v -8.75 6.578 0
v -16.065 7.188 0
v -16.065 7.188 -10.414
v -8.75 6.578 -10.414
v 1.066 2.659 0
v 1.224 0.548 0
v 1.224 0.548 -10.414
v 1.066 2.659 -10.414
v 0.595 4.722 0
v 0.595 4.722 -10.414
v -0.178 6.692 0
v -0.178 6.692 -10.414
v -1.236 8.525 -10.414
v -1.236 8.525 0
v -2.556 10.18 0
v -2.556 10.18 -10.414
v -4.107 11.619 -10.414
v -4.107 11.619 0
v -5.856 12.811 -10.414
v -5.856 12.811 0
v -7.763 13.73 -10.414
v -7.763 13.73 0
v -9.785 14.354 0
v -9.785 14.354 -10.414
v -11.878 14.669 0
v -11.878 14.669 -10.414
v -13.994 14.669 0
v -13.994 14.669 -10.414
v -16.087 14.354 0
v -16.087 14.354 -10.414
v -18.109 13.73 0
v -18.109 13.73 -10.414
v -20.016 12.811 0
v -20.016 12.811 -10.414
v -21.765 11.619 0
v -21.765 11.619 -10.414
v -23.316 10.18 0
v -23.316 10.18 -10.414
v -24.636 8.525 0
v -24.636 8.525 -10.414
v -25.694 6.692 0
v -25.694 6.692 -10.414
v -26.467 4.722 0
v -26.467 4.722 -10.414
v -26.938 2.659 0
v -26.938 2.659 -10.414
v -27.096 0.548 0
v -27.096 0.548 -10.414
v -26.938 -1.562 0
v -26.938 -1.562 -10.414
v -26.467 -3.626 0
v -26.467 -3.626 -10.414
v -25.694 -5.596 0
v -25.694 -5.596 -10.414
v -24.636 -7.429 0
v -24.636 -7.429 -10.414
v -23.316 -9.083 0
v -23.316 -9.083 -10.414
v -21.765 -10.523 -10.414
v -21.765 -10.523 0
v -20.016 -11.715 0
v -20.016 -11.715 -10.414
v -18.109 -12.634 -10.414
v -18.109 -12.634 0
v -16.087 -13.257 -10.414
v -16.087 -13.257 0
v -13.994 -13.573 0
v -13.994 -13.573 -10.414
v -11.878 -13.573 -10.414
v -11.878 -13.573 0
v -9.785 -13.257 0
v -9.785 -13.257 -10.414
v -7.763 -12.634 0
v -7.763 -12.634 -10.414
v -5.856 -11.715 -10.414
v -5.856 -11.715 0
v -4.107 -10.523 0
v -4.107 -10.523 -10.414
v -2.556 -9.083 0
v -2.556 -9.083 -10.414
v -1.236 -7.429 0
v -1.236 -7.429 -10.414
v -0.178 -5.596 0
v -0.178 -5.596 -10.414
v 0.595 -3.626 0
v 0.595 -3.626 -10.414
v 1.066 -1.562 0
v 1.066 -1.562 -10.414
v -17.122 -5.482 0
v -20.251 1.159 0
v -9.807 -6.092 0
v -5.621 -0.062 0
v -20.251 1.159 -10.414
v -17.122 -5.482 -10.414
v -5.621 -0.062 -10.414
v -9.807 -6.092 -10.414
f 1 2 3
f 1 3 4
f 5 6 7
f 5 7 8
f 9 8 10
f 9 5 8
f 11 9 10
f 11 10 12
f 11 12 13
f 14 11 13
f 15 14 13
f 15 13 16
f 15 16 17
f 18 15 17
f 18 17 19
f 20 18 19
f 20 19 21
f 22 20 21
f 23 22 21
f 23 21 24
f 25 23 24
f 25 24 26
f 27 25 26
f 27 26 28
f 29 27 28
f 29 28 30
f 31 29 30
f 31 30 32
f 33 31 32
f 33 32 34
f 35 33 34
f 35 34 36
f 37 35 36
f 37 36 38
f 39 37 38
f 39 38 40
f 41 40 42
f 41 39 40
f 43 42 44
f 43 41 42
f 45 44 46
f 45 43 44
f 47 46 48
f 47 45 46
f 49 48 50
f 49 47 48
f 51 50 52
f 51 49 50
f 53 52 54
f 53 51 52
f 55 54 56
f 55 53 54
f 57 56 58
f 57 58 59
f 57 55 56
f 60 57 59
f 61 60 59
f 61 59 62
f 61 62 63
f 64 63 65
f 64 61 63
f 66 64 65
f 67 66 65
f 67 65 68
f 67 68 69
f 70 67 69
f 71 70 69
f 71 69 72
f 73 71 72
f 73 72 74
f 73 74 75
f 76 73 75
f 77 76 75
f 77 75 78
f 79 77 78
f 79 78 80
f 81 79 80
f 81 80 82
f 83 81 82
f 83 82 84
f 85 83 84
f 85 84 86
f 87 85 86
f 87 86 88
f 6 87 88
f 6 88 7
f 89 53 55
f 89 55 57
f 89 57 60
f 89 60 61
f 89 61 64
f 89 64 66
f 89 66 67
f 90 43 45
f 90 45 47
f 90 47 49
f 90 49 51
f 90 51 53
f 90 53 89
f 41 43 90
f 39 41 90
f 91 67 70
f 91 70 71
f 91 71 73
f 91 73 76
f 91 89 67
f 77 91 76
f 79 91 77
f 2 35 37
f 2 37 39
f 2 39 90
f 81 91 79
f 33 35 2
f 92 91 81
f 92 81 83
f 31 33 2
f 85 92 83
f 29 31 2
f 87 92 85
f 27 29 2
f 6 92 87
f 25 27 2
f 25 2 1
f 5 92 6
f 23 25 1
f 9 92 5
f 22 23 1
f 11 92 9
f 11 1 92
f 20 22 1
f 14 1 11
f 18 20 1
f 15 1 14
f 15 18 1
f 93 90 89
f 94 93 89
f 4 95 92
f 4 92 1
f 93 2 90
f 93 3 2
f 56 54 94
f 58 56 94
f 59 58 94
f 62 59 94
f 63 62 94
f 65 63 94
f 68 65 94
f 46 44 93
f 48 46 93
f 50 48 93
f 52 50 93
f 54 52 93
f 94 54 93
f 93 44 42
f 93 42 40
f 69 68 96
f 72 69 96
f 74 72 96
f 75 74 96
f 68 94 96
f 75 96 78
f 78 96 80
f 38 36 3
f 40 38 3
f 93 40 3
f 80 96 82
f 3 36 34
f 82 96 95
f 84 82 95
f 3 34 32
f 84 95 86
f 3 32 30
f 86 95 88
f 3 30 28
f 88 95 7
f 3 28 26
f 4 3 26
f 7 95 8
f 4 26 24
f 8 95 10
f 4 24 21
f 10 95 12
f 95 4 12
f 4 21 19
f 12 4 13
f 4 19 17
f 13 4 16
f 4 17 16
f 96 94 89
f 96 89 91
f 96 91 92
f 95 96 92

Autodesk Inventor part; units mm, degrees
ref_plane "YZ Plane" through (0, 0, 0) normal (1, 0, 0) x (0, 1, 0)
ref_plane "XZ Plane" through (0, 0, 0) normal (0, 1, 0) x (-1, 0, 0)
ref_plane "XY Plane" through (0, 0, 0) normal (0, 0, 1) x (1, 0, 0)
sketch "Sketch1" plane through (0, 0, 0) normal (0, 0, 1) x (1, 0, 0)
  circle A0 centre (-12.936, 0.5481) radius 6.35
  circle A1 centre (-12.936, 0.5481) radius 14.1605
  point P0 (0, 0)
  dimension "d0" = 12.7
  dimension "d1" = 28.321
extrude "Extrusion1" add sketch "Sketch1" against normal blind 10.414
sketch "Sketch2" plane through (-12.936, 0.5481, -10.414) normal (0, 0, -1) x (-1, 0, 0)
  circle A0 centre (0, 0) radius 14.1605 projected
  line L0 (3.1289, 6.6404) -> (-4.1863, 6.0299)
  line L1 (3.1289, 6.6404) -> (7.3152, 0.6105)
  line L2 (7.3152, 0.6105) -> (4.1863, -6.0299)
  line L3 (4.1863, -6.0299) -> (-3.1289, -6.6404)
  line L4 (-3.1289, -6.6404) -> (-7.3152, -0.6105)
  line L5 (-7.3152, -0.6105) -> (-4.1863, 6.0299)
  point P0 (-12.936, -0.5481)
  dimension "d5" = 7.3406
  dimension "d6" = 7.3406
  dimension "d7" = 7.3406
  dimension "d8" = 7.3406
  dimension "d9" = 120
  dimension "d10" = 120
  dimension "d11" = 120
  dimension "d12" = 7.3406
  dimension "d13" = 120
  dimension "d14" = 120
  dimension "d15" = 120
  dimension "d16" = 12.7143
  dimension "d17" = 6.3571
  dimension "d18" = 14.6303
  dimension "d19" = 7.3152
extrude "Extrusion2" cut sketch "Sketch2" against normal blind 25.4 contours L1 L2 L3 L4 L5 L0
equation "\"d6\" = d5"
equation "\"d7\" = d5"
equation "\"d8\" = d5"
equation "\"d9\" = d10"
equation "\"d12\" = d5"
equation "\"d17\" = 0.5 * d16"
equation "\"d19\" = 0.5 * d18"
properties part number "ShaftCollar"
